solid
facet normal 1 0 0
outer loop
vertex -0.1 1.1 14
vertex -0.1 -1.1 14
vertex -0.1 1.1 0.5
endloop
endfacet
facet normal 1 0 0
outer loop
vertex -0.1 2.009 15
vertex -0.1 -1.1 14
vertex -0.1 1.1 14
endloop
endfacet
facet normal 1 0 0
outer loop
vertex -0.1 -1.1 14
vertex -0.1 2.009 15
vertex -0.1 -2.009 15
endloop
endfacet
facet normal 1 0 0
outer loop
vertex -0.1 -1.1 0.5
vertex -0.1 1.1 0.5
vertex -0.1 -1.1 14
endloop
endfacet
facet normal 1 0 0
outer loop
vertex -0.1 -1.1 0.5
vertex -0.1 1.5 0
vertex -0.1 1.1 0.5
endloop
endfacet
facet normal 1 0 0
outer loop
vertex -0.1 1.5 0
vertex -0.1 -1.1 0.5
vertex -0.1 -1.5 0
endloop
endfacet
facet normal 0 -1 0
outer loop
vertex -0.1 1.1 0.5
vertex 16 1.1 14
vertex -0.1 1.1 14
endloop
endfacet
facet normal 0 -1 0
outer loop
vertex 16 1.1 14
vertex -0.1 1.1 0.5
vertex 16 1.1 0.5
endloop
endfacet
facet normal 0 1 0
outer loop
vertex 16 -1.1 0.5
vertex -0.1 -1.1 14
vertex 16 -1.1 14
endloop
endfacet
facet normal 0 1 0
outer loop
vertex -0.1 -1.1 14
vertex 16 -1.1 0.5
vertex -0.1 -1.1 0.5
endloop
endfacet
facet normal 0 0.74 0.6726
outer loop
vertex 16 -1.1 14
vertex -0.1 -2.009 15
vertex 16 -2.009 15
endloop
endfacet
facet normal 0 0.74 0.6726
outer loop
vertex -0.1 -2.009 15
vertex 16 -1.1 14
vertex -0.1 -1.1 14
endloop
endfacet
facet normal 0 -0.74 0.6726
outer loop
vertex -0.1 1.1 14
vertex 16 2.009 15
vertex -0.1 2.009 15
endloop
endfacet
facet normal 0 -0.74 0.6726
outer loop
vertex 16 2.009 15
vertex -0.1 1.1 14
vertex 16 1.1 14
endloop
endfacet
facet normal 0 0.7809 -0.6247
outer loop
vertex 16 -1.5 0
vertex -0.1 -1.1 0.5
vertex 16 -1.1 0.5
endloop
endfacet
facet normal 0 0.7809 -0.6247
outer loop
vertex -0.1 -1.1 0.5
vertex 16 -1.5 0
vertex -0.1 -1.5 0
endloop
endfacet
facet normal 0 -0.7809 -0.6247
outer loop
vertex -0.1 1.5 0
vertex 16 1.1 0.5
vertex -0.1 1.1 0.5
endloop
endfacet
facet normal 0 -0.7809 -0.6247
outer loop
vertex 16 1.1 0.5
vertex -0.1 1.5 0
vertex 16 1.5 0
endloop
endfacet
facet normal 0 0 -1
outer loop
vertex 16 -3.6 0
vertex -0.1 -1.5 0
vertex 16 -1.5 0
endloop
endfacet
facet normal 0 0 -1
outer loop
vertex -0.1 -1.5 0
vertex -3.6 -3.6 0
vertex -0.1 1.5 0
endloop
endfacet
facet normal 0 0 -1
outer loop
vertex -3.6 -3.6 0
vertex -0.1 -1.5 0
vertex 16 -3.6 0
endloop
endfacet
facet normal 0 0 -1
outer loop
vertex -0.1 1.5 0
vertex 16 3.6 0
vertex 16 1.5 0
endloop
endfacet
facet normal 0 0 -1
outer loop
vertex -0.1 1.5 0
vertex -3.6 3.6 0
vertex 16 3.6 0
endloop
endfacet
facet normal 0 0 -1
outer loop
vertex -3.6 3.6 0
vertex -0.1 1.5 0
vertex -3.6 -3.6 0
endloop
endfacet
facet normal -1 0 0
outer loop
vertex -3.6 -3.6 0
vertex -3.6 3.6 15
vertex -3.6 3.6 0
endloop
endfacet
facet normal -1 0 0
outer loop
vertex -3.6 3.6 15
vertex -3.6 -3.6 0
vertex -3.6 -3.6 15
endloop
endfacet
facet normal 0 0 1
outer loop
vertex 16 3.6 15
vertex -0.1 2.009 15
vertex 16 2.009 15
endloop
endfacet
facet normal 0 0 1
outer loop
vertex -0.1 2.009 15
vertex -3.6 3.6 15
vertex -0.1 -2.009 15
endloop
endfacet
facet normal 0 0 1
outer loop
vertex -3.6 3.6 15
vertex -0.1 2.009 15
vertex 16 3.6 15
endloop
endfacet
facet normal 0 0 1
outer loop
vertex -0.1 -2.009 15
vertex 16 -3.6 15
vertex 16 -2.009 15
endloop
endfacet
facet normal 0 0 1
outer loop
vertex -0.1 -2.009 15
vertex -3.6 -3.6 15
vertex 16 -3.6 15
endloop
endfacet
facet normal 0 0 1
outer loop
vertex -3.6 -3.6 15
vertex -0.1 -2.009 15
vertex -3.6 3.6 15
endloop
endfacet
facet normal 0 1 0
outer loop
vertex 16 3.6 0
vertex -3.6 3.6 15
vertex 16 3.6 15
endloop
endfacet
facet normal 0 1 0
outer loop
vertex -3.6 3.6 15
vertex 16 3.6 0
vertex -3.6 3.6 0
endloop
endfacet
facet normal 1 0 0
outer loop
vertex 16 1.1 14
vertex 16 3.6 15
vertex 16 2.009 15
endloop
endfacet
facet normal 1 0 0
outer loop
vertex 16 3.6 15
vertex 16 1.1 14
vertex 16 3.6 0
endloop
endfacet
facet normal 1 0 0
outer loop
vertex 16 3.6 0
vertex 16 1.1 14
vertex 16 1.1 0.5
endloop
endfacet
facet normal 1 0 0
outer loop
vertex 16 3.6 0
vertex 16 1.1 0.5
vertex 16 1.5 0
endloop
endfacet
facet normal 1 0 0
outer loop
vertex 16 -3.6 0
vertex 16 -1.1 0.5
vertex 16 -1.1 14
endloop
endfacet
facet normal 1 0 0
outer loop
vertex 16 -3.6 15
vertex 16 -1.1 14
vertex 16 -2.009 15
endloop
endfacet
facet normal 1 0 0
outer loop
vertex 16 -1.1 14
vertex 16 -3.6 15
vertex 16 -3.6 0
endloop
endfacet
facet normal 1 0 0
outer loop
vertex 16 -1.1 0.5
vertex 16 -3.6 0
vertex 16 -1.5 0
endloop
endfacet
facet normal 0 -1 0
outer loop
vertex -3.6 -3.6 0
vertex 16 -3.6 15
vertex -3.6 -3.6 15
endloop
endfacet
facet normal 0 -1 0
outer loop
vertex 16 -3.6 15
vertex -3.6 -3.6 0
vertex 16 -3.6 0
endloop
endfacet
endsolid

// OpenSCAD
/* [Basis-Einstellungen] */

// Art des Verbinders
Verbinder_Typ = "Toleranz_Test"; // [Kreuz, T-Stueck, Ecke, Gerade, Endstueck, Aufsteck_Kreuz, Aufsteck_T_Stueck, Aufsteck_Ecke_Rechts, Aufsteck_Ecke_Links, Toleranz_Test]

// Gesamthöhe des Bauteils (in mm)
Hoehe = 40; // [10:1:150]

/* [Passform & Maße] */

// Exakte Dicke deiner gedruckten Trennwände (in mm)
Wand_Dicke = 2; // [0.8:0.1:10.0]

// Extra-Platz im Schlitz, damit die Wand nicht klemmt (0.2mm ist meist ideal)
Toleranz = 0.2; // [0.0:0.01:1.0]

// Wie tief soll die Wand in den normalen Verbinder rutschen? (in mm)
Einschub_Tiefe = 14.0; // [5:1:30]

// Dicke der Außenwände des Verbinders selbst (in mm)
Wandung_Aussen = 2.5; // [1.0:0.1:5.0]

// Gesamtlänge eines Arms, gemessen aus der absoluten Mitte (in mm)
Arm_Laenge = 20.0; // [10:1:100]

// Radius für die weiche, stabilisierende Innenkurve (in mm)
Innere_Rundung = 10.0; // [0:0.1:20]

/* [Extras] */

// Dicke des Bodens bei Aufsteck-Verbindern, damit sie nicht zerfallen (in mm)
Boden_Dicke = 2.0; // [0.5:0.1:5.0]

// Schräge an der Oberkante zum leichteren Einstecken (in mm)
Einfuehrhilfe = 1.0; // [0:0.1:5.0]


/* [Optimierung & Befestigung] */

// Gleicht den breiteren ersten Layer (Elefantenfuß) in den Schlitzen aus (in mm, 0 = aus)
Elefantenfuss_Kompensation = 0.4; // [0:0.1:2.0]

// Durchmesser für Magnete/Rutschpads an der Unterseite (nur bei T-Stück/Kreuz aktiv, in mm, 0 = aus)
Magnet_Durchmesser = 5.0; // [0:0.1:5.0]

// Tiefe für den Magneten an der Unterseite (in mm)
Magnet_Tiefe = 2.0; // [0.1:0.1:10]


/* [Hidden] */
/* --- Ab hier arbeitet das Skript im Hintergrund und bleibt unsichtbar --- */

$fn = 64; 

schlitz_breite = Wand_Dicke + Toleranz;
arm_breite = schlitz_breite + (2 * Wandung_Aussen);

// Boolean Logik zur Steuerung der Bauteile
is_kreuz = (Verbinder_Typ == "Kreuz");
is_tstueck = (Verbinder_Typ == "T-Stueck");
is_ecke = (Verbinder_Typ == "Ecke");
is_gerade = (Verbinder_Typ == "Gerade");
is_end = (Verbinder_Typ == "Endstueck");
is_auf_kreuz = (Verbinder_Typ == "Aufsteck_Kreuz");
is_auf_t = (Verbinder_Typ == "Aufsteck_T_Stueck");
is_auf_ecke_r = (Verbinder_Typ == "Aufsteck_Ecke_Rechts");
is_auf_ecke_l = (Verbinder_Typ == "Aufsteck_Ecke_Links");
is_test = (Verbinder_Typ == "Toleranz_Test");

is_aufsteck = is_auf_kreuz || is_auf_t || is_auf_ecke_r || is_auf_ecke_l;

// Erlaubnis-Prüfung für Magnete (nur bei T-Stücken und Kreuzungen)
is_magnet_erlaubt = is_kreuz || is_tstueck || is_auf_kreuz || is_auf_t;

// Spezielle Maße für den Toleranz-Test (überschreibt temporär die Standard-Werte für extrem kurze Druckzeit)
eff_Hoehe = is_test ? min(15, Hoehe) : Hoehe;
eff_Arm_Laenge = is_test ? max(Einschub_Tiefe + 2, 15) : Arm_Laenge;

// Welche physischen Arme existieren im Modell?
arm_0   = is_kreuz || is_tstueck || is_ecke || is_gerade || is_end || is_auf_kreuz || is_auf_t || is_auf_ecke_r || is_test; 
arm_90  = is_kreuz || is_tstueck || is_ecke || is_auf_kreuz || is_auf_t || is_auf_ecke_r || is_auf_ecke_l; 
arm_180 = is_kreuz || is_tstueck || is_gerade || is_auf_kreuz || is_auf_ecke_l; 
arm_270 = is_kreuz || is_auf_kreuz || is_auf_t; 

// Welche Schlitze muessen geschnitten werden?
schlitz_0   = arm_0;
schlitz_90  = arm_90;
schlitz_180 = arm_180;
schlitz_270 = arm_270 || is_auf_ecke_r || is_auf_ecke_l;

// Welche Schlitze gehen komplett von der Mitte durch?
durchgehend_0   = is_test; // Der Testdruck bekommt einen durchgehenden Schlitz zum einfachen Durchschieben
durchgehend_90  = is_aufsteck;
durchgehend_180 = false;
durchgehend_270 = is_aufsteck;

difference() {
    // 1. Die massive Grundform hochziehen
    linear_extrude(height = eff_Hoehe) {
        union() {
            square([arm_breite, arm_breite], center = true);
            
            if (arm_0) arm_solid();
            if (arm_90) rotate(90) arm_solid();
            if (arm_180) rotate(180) arm_solid();
            if (arm_270) rotate(270) arm_solid();
            
            if (Innere_Rundung > 0) {
                if (arm_0 && arm_90) innen_rundung_add(Innere_Rundung);
                if (arm_90 && arm_180) rotate(90) innen_rundung_add(Innere_Rundung);
                if (arm_180 && arm_270) rotate(180) innen_rundung_add(Innere_Rundung);
                if (arm_270 && arm_0) rotate(270) innen_rundung_add(Innere_Rundung);
            }
        }
    }
    
    // 2. Schlitze und Einführhilfe abziehen
    if (schlitz_0) schlitz_3d(durchgehend_0);
    if (schlitz_90) rotate([0,0,90]) schlitz_3d(durchgehend_90);
    if (schlitz_180) rotate([0,0,180]) schlitz_3d(durchgehend_180);
    if (schlitz_270) rotate([0,0,270]) schlitz_3d(durchgehend_270);
    
    // 3. Magnet/Rutschpad Loch an der Unterseite (nur wenn erlaubt)
    if (Magnet_Durchmesser > 0 && Magnet_Tiefe > 0 && is_magnet_erlaubt && !is_test) {
        translate([0, 0, -0.1])
            cylinder(d=Magnet_Durchmesser, h=Magnet_Tiefe + 0.1);
    }
}

// --- Hilfsmodule (2D) ---
module arm_solid() {
    translate([0, -arm_breite/2])
        square([eff_Arm_Laenge, arm_breite]);
}

module innen_rundung_add(r) {
    translate([arm_breite/2 - 0.01, arm_breite/2 - 0.01])
        difference() {
            square([r + 0.01, r + 0.01]);
            translate([r + 0.01, r + 0.01]) circle(r=r);
        }
}

// --- Hilfsmodule (3D) ---
module schlitz_3d(durchgehend = false) {
    start_x = durchgehend ? -0.1 : (eff_Arm_Laenge - Einschub_Tiefe);
    laenge = durchgehend ? (eff_Arm_Laenge + 1) : (Einschub_Tiefe + 1);
    
    z_start = is_aufsteck ? Boden_Dicke : -1;
    
    // Hauptschlitz
    translate([0, 0, z_start]) 
        linear_extrude(height = eff_Hoehe + 2) 
            translate([start_x, -schlitz_breite/2])
                square([laenge, schlitz_breite]);
                
    // Trichterförmige Einführhilfe
    if (Einfuehrhilfe > 0) {
        hull() {
            translate([start_x, -schlitz_breite/2, eff_Hoehe - Einfuehrhilfe])
                cube([laenge, schlitz_breite, 0.1]);
                
            translate([start_x, -(schlitz_breite + 2*Einfuehrhilfe)/2, eff_Hoehe + 0.1])
                cube([laenge, schlitz_breite + 2*Einfuehrhilfe, 0.1]);
        }
    }
    
    // Elefantenfuß-Kompensation am Boden (nur bei Verbindern, die direkt auf dem Druckbett aufliegen)
    if (!is_aufsteck && Elefantenfuss_Kompensation > 0) {
        hull() {
            // Etwas breiter direkt am Druckbett
            translate([start_x, -(schlitz_breite + 2*Elefantenfuss_Kompensation)/2, -0.1])
                cube([laenge, schlitz_breite + 2*Elefantenfuss_Kompensation, 0.1]);
            // Normalmaß erreicht auf Höhe der Kompensations-Einstellung
            translate([start_x, -schlitz_breite/2, Elefantenfuss_Kompensation])
                cube([laenge, schlitz_breite, 0.1]);
        }
    }
}
